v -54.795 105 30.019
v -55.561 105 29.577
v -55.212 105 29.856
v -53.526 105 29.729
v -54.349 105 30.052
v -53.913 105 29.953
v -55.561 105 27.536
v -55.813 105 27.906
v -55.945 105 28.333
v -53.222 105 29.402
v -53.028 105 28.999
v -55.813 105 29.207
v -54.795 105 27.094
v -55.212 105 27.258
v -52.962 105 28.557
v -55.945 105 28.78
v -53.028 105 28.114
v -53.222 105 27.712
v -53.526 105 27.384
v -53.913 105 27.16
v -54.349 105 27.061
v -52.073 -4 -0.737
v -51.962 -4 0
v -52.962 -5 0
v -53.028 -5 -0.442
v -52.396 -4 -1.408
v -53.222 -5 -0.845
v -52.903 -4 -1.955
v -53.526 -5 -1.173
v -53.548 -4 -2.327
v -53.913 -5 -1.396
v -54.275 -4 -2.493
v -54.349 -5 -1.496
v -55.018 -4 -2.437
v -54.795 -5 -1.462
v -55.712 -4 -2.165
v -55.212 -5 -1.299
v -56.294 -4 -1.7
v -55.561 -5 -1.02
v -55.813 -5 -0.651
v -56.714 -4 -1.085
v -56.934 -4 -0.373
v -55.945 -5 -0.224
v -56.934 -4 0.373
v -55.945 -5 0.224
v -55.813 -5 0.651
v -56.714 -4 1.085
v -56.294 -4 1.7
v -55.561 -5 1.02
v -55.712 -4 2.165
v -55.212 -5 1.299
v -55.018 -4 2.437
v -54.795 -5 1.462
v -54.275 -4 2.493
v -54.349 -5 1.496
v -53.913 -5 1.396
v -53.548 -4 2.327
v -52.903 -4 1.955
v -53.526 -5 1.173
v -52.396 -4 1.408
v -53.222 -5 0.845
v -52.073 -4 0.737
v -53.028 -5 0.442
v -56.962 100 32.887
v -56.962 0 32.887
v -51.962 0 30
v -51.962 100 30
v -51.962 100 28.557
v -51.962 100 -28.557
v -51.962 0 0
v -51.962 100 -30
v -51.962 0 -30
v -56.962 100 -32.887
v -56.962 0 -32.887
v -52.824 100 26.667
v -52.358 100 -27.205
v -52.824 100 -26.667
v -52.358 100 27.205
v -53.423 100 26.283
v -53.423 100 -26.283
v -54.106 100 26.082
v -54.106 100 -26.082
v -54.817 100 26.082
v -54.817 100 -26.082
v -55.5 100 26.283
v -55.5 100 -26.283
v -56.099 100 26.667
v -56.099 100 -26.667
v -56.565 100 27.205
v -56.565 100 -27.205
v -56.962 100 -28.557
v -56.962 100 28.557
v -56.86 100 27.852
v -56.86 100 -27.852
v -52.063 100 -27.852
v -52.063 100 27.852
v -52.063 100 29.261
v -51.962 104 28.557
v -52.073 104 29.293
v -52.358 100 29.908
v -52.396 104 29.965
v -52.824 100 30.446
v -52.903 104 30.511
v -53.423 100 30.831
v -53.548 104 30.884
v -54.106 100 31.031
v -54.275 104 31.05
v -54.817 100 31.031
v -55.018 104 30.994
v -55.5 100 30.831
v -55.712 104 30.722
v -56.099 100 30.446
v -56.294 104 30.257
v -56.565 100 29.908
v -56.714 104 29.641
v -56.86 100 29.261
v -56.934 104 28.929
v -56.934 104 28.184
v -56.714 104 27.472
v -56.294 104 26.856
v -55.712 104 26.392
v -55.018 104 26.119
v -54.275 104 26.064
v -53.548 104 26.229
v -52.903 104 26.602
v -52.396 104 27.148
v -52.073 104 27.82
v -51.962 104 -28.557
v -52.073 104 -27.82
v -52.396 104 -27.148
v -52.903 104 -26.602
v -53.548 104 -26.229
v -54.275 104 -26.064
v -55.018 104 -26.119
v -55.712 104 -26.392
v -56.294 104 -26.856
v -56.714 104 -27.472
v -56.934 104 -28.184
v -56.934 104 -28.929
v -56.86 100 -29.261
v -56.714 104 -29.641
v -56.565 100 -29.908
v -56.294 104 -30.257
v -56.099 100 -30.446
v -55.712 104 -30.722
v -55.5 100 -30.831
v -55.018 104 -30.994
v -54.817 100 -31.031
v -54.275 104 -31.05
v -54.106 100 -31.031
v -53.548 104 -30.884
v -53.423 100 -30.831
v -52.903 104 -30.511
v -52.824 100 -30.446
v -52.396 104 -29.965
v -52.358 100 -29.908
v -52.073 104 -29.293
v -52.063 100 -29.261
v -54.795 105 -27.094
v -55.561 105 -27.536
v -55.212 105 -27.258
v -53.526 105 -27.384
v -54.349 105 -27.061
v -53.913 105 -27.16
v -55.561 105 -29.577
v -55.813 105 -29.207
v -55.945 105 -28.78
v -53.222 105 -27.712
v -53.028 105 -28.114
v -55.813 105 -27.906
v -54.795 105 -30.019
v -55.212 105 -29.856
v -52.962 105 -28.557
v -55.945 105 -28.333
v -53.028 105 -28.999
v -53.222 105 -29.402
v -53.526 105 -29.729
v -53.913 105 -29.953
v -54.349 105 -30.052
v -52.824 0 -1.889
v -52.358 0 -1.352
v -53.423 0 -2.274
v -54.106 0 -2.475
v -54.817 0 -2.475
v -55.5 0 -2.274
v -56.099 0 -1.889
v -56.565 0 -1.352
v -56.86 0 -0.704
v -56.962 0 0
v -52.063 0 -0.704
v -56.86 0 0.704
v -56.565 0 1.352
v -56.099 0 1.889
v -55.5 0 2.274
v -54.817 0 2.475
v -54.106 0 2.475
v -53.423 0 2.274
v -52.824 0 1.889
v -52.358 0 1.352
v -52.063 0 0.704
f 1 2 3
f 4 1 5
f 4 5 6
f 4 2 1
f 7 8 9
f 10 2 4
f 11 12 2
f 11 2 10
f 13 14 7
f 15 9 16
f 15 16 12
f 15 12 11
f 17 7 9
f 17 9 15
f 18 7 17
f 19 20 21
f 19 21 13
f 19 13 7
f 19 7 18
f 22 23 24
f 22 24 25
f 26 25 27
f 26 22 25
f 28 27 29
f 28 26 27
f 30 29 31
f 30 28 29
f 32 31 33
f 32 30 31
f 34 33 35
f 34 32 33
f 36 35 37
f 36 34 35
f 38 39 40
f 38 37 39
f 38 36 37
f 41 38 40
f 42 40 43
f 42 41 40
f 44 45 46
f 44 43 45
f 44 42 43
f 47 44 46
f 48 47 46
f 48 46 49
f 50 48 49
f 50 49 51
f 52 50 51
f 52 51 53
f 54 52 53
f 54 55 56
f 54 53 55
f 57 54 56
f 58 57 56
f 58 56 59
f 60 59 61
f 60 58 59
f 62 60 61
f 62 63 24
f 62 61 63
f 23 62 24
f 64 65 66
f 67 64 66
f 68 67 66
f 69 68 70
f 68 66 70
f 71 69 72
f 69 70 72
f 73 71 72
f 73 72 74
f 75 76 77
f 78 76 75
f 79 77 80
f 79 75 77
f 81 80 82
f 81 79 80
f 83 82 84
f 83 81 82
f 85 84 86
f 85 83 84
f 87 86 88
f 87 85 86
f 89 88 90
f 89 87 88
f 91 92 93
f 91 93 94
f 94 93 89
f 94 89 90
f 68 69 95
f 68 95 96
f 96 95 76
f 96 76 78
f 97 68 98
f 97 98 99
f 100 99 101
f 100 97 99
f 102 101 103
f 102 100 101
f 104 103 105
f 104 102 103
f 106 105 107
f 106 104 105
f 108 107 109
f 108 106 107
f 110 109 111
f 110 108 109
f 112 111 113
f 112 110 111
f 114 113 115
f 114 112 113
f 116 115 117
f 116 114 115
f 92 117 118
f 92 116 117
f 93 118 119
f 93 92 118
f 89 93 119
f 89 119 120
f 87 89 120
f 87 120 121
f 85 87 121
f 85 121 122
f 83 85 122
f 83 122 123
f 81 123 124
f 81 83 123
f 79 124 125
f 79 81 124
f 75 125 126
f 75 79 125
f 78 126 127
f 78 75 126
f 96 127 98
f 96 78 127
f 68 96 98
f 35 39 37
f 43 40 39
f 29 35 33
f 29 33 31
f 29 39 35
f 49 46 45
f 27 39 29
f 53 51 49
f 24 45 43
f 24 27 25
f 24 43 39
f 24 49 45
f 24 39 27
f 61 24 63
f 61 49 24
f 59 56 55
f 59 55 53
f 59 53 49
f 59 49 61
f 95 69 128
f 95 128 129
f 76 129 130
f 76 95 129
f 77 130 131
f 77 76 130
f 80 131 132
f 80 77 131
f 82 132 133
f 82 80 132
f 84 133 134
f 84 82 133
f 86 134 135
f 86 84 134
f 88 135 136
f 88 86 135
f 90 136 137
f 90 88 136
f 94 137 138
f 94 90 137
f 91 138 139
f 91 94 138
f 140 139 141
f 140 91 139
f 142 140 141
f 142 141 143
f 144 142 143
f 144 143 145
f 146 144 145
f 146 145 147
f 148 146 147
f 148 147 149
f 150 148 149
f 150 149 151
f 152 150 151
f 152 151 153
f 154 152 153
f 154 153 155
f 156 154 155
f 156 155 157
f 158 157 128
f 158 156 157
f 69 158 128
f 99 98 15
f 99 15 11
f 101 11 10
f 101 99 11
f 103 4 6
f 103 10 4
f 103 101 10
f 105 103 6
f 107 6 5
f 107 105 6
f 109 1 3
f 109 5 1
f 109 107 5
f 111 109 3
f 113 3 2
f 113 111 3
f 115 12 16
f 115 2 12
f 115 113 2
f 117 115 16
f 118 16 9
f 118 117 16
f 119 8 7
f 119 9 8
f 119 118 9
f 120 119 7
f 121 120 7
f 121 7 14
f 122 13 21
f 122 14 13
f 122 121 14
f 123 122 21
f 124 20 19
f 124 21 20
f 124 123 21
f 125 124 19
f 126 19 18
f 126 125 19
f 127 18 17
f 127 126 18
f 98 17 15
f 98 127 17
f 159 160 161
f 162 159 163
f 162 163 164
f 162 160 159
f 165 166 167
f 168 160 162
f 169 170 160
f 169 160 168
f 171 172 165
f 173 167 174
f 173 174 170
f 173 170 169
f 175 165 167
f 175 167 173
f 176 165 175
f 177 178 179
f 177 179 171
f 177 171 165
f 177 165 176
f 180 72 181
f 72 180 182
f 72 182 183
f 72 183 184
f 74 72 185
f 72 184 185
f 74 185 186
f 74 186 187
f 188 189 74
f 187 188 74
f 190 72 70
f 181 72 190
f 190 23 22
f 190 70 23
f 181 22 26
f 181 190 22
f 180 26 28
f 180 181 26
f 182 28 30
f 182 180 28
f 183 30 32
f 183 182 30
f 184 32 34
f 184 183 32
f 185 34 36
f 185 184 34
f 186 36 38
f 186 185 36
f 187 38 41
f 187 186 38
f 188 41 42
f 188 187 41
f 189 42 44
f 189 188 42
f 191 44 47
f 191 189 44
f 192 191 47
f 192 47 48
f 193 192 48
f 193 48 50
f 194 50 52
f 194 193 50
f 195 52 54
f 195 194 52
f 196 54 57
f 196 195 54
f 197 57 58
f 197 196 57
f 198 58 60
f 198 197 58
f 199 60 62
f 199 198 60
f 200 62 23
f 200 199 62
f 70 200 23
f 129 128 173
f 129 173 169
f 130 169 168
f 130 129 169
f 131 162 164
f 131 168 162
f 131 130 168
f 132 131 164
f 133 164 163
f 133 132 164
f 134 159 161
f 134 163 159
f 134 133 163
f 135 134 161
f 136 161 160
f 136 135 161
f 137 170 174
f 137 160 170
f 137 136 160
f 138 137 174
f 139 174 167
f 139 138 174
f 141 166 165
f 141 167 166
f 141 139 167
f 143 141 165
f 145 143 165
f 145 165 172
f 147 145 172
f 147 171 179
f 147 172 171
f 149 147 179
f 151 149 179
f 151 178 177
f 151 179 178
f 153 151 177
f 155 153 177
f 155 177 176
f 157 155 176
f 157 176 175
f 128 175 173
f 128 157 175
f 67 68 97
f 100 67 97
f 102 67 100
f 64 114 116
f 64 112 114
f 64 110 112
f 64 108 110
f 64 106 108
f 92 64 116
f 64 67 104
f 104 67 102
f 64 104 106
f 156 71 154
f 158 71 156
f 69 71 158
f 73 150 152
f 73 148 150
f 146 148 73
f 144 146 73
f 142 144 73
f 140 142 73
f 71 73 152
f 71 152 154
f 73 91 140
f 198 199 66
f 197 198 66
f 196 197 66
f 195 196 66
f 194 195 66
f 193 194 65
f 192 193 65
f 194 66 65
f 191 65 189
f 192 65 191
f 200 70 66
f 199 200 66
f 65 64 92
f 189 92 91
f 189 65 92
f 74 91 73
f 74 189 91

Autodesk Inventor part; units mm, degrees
ref_plane "YZ Plane" through (0, 0, 0) normal (1, 0, 0) x (0, 1, 0)
ref_plane "XZ Plane" through (0, 0, 0) normal (0, 1, 0) x (-1, 0, 0)
ref_plane "XY Plane" through (0, 0, 0) normal (0, 0, 1) x (1, 0, 0)
sketch "스케치2" plane through (0, 0, 0) normal (0, 1, 0) x (-1, 0, 0)
  line L0 (0, -60) -> (-51.9615, -30)
  line L1 (-51.9615, -30) -> (-51.9615, 30)
  line L2 (-51.9615, 30) -> (0, 60)
  line L3 (0, 60) -> (51.9615, 30)
  line L4 (51.9615, 30) -> (51.9615, -30)
  line L5 (51.9615, -30) -> (0, -60)
  line L6 (0, -65.7735) -> (-56.9615, -32.8868)
  line L7 (-56.9615, -32.8868) -> (-56.9615, 32.8868)
  line L8 (-56.9615, 32.8868) -> (0, 65.7735)
  line L9 (0, 65.7735) -> (56.9615, 32.8868)
  line L10 (56.9615, 32.8868) -> (56.9615, -32.8868)
  line L11 (56.9615, -32.8868) -> (0, -65.7735)
  line L12 (51.9615, -30) -> (56.9615, -32.8868)
  line L13 (56.9615, 32.8868) -> (51.9615, 30)
  point P0 (0, 0)
  point P1 (0, 0)
  dimension "d0" = 60
  dimension "d1" = 5
extrude "돌출1" add sketch "스케치2" along normal blind 100 contours L4 L13 L10 L12
sketch "스케치3" plane through (0, 100, 0) normal (0, 1, 0) x (1, 0, 0)
  line L0 (-56.9615, -32.8868) -> (-51.9615, -30) construction
  line L1 (-51.9615, 30) -> (-56.9615, 32.8868) construction
  line L2 (-56.9615, 32.8868) -> (-56.9615, -32.8868) construction
  circle A0 centre (-54.4615, 28.5566) radius 2.5
  circle A1 centre (-54.4615, -28.5566) radius 2.5
  point P0 (0, 0)
  dimension "d4" = 5
  dimension "d5" = 5
extrude "돌출2" add sketch "스케치3" along normal blind 5
sketch "스케치4" plane through (0, 0, 0) normal (0, -1, 0) x (1, 0, 0)
  line L0 (-51.9615, 30) -> (-51.9615, -30) construction
  circle A0 centre (-54.4615, 0) radius 2.5
  point P0 (0, 0)
  dimension "d8" = 5
extrude "돌출3" add sketch "스케치4" along normal blind 5
chamfer "모따기1" distance 1 angle 45 3 edges at (-56.9615, 105, 28.5566) (-56.9615, 105, -28.5566) (-56.9615, -5, 0)
properties part number "col"
